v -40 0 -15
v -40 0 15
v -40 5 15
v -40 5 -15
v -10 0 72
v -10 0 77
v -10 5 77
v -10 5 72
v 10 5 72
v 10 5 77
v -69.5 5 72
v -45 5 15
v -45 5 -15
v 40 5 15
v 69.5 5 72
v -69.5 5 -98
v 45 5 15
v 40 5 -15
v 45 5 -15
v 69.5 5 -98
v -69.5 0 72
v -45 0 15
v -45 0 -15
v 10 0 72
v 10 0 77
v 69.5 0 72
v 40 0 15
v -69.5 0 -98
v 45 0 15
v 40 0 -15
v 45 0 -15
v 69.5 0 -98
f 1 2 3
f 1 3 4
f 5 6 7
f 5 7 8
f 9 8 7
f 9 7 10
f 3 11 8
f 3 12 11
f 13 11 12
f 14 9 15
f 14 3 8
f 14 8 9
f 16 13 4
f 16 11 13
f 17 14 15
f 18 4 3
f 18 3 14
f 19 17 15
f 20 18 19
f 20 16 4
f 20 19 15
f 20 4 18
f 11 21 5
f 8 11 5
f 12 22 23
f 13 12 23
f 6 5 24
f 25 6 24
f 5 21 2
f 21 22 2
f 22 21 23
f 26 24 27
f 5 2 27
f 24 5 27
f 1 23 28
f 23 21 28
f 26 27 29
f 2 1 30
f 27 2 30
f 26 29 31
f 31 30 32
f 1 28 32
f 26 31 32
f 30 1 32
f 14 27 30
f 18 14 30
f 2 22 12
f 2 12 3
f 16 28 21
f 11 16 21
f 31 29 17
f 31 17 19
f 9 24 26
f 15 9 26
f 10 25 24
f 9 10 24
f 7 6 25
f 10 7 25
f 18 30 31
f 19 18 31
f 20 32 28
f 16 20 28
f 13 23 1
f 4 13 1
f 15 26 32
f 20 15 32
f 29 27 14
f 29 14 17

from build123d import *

# Parameters (mm, degrees)
SKETCH1_W           = 5
SKETCH1_H           = 30
SKETCH1_W_2         = 20
SKETCH1_H_2         = 5
BOSS_EXTRUDE1_DEPTH = 5


with BuildPart() as part:
    # Sketch1 → Boss-Extrude1 (new body)
    # profile 1 of 2: a face of its own
    with BuildSketch(Plane(origin=(0, 0, 0), x_dir=(1, 0, 0), z_dir=(0, 1, 0))):
        Polygon((69.5, -72), (69.5, 98), (61.25, 98), (-61.25, 98), (-69.5, 98), (-69.5, -72), (-45, -72), (-10, -72), (10, -72), (45, -72), align=None)
        with Locations((42.5, 0)):
            Rectangle(SKETCH1_W, SKETCH1_H, mode=Mode.SUBTRACT)
        with Locations((-42.5, 0)):
            Rectangle(SKETCH1_W, SKETCH1_H, mode=Mode.SUBTRACT)
    # profile 2 of 2: a face of its own
    with BuildSketch(Plane(origin=(0, 0, 0), x_dir=(1, 0, 0), z_dir=(0, 1, 0))):
        with Locations((0, -74.5)):
            Rectangle(SKETCH1_W_2, SKETCH1_H_2)
    extrude(amount=BOSS_EXTRUDE1_DEPTH)


solid = part.part
